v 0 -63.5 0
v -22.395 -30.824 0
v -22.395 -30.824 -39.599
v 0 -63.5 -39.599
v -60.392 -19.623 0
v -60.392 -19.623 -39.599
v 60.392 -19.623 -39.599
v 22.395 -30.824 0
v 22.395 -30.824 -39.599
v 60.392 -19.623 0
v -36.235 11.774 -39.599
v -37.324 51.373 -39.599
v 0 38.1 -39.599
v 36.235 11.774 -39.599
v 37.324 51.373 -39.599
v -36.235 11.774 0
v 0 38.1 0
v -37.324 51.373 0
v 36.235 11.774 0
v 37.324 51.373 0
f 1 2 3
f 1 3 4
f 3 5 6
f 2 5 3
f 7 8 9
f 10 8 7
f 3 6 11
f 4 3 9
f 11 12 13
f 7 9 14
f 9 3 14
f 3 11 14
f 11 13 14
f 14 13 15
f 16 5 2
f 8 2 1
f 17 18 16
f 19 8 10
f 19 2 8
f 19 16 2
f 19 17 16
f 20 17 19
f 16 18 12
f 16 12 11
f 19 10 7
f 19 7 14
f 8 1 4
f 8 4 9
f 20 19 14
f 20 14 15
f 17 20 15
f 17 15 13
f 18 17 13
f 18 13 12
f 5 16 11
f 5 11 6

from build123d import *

# Parameters (mm, degrees)
F1_DEPTH = 39.5986


with BuildPart() as f1:
    # F0 (on Top) → F1 (new body)
    with BuildSketch(Plane.XY):
        Polygon((36.235253, 11.773547), (37.324364, 51.372579), (0, 38.1), (-37.324364, 51.372579), (-36.235253, 11.773547), (0, 0), (22.394618, -30.823547), (60.392089, -19.622579), align=None)
        Polygon((-22.394618, -30.823547), (0, -63.5), (22.394618, -30.823547), (0, 0), (-36.235253, 11.773547), (-60.392089, -19.622579), align=None)
    extrude(amount=-F1_DEPTH)


solid = f1.part
